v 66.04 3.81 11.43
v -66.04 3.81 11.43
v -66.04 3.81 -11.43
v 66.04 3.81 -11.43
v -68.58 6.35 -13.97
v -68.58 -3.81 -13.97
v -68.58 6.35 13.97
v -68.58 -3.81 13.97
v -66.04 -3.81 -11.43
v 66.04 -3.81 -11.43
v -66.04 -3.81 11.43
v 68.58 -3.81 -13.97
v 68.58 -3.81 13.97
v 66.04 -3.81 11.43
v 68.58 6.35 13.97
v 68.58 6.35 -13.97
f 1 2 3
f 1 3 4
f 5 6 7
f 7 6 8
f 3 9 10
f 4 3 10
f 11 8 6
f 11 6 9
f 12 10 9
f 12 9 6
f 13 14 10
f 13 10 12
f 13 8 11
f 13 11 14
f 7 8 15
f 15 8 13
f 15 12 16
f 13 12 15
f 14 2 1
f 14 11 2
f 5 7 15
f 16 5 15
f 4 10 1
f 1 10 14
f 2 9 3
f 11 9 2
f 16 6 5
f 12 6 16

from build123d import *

# Parameters (mm, degrees)
F0_W     = 132.08
F0_H     = 22.86
F1_DEPTH = 3.81
F2_T     = 2.54


with BuildPart() as f1:
    # F0 (on Front) → F1 (new body, symmetric)
    with BuildSketch(Plane.XZ):
        Rectangle(F0_W, F0_H)
    extrude(amount=F1_DEPTH, both=True)

    # F2
    f2_openings = [f1.faces().sort_by_distance(p)[0] for p in [
        (0, -3.81, 0),
    ]]
    offset(amount=F2_T, openings=f2_openings, kind=Kind.INTERSECTION)


solid = f1.part
